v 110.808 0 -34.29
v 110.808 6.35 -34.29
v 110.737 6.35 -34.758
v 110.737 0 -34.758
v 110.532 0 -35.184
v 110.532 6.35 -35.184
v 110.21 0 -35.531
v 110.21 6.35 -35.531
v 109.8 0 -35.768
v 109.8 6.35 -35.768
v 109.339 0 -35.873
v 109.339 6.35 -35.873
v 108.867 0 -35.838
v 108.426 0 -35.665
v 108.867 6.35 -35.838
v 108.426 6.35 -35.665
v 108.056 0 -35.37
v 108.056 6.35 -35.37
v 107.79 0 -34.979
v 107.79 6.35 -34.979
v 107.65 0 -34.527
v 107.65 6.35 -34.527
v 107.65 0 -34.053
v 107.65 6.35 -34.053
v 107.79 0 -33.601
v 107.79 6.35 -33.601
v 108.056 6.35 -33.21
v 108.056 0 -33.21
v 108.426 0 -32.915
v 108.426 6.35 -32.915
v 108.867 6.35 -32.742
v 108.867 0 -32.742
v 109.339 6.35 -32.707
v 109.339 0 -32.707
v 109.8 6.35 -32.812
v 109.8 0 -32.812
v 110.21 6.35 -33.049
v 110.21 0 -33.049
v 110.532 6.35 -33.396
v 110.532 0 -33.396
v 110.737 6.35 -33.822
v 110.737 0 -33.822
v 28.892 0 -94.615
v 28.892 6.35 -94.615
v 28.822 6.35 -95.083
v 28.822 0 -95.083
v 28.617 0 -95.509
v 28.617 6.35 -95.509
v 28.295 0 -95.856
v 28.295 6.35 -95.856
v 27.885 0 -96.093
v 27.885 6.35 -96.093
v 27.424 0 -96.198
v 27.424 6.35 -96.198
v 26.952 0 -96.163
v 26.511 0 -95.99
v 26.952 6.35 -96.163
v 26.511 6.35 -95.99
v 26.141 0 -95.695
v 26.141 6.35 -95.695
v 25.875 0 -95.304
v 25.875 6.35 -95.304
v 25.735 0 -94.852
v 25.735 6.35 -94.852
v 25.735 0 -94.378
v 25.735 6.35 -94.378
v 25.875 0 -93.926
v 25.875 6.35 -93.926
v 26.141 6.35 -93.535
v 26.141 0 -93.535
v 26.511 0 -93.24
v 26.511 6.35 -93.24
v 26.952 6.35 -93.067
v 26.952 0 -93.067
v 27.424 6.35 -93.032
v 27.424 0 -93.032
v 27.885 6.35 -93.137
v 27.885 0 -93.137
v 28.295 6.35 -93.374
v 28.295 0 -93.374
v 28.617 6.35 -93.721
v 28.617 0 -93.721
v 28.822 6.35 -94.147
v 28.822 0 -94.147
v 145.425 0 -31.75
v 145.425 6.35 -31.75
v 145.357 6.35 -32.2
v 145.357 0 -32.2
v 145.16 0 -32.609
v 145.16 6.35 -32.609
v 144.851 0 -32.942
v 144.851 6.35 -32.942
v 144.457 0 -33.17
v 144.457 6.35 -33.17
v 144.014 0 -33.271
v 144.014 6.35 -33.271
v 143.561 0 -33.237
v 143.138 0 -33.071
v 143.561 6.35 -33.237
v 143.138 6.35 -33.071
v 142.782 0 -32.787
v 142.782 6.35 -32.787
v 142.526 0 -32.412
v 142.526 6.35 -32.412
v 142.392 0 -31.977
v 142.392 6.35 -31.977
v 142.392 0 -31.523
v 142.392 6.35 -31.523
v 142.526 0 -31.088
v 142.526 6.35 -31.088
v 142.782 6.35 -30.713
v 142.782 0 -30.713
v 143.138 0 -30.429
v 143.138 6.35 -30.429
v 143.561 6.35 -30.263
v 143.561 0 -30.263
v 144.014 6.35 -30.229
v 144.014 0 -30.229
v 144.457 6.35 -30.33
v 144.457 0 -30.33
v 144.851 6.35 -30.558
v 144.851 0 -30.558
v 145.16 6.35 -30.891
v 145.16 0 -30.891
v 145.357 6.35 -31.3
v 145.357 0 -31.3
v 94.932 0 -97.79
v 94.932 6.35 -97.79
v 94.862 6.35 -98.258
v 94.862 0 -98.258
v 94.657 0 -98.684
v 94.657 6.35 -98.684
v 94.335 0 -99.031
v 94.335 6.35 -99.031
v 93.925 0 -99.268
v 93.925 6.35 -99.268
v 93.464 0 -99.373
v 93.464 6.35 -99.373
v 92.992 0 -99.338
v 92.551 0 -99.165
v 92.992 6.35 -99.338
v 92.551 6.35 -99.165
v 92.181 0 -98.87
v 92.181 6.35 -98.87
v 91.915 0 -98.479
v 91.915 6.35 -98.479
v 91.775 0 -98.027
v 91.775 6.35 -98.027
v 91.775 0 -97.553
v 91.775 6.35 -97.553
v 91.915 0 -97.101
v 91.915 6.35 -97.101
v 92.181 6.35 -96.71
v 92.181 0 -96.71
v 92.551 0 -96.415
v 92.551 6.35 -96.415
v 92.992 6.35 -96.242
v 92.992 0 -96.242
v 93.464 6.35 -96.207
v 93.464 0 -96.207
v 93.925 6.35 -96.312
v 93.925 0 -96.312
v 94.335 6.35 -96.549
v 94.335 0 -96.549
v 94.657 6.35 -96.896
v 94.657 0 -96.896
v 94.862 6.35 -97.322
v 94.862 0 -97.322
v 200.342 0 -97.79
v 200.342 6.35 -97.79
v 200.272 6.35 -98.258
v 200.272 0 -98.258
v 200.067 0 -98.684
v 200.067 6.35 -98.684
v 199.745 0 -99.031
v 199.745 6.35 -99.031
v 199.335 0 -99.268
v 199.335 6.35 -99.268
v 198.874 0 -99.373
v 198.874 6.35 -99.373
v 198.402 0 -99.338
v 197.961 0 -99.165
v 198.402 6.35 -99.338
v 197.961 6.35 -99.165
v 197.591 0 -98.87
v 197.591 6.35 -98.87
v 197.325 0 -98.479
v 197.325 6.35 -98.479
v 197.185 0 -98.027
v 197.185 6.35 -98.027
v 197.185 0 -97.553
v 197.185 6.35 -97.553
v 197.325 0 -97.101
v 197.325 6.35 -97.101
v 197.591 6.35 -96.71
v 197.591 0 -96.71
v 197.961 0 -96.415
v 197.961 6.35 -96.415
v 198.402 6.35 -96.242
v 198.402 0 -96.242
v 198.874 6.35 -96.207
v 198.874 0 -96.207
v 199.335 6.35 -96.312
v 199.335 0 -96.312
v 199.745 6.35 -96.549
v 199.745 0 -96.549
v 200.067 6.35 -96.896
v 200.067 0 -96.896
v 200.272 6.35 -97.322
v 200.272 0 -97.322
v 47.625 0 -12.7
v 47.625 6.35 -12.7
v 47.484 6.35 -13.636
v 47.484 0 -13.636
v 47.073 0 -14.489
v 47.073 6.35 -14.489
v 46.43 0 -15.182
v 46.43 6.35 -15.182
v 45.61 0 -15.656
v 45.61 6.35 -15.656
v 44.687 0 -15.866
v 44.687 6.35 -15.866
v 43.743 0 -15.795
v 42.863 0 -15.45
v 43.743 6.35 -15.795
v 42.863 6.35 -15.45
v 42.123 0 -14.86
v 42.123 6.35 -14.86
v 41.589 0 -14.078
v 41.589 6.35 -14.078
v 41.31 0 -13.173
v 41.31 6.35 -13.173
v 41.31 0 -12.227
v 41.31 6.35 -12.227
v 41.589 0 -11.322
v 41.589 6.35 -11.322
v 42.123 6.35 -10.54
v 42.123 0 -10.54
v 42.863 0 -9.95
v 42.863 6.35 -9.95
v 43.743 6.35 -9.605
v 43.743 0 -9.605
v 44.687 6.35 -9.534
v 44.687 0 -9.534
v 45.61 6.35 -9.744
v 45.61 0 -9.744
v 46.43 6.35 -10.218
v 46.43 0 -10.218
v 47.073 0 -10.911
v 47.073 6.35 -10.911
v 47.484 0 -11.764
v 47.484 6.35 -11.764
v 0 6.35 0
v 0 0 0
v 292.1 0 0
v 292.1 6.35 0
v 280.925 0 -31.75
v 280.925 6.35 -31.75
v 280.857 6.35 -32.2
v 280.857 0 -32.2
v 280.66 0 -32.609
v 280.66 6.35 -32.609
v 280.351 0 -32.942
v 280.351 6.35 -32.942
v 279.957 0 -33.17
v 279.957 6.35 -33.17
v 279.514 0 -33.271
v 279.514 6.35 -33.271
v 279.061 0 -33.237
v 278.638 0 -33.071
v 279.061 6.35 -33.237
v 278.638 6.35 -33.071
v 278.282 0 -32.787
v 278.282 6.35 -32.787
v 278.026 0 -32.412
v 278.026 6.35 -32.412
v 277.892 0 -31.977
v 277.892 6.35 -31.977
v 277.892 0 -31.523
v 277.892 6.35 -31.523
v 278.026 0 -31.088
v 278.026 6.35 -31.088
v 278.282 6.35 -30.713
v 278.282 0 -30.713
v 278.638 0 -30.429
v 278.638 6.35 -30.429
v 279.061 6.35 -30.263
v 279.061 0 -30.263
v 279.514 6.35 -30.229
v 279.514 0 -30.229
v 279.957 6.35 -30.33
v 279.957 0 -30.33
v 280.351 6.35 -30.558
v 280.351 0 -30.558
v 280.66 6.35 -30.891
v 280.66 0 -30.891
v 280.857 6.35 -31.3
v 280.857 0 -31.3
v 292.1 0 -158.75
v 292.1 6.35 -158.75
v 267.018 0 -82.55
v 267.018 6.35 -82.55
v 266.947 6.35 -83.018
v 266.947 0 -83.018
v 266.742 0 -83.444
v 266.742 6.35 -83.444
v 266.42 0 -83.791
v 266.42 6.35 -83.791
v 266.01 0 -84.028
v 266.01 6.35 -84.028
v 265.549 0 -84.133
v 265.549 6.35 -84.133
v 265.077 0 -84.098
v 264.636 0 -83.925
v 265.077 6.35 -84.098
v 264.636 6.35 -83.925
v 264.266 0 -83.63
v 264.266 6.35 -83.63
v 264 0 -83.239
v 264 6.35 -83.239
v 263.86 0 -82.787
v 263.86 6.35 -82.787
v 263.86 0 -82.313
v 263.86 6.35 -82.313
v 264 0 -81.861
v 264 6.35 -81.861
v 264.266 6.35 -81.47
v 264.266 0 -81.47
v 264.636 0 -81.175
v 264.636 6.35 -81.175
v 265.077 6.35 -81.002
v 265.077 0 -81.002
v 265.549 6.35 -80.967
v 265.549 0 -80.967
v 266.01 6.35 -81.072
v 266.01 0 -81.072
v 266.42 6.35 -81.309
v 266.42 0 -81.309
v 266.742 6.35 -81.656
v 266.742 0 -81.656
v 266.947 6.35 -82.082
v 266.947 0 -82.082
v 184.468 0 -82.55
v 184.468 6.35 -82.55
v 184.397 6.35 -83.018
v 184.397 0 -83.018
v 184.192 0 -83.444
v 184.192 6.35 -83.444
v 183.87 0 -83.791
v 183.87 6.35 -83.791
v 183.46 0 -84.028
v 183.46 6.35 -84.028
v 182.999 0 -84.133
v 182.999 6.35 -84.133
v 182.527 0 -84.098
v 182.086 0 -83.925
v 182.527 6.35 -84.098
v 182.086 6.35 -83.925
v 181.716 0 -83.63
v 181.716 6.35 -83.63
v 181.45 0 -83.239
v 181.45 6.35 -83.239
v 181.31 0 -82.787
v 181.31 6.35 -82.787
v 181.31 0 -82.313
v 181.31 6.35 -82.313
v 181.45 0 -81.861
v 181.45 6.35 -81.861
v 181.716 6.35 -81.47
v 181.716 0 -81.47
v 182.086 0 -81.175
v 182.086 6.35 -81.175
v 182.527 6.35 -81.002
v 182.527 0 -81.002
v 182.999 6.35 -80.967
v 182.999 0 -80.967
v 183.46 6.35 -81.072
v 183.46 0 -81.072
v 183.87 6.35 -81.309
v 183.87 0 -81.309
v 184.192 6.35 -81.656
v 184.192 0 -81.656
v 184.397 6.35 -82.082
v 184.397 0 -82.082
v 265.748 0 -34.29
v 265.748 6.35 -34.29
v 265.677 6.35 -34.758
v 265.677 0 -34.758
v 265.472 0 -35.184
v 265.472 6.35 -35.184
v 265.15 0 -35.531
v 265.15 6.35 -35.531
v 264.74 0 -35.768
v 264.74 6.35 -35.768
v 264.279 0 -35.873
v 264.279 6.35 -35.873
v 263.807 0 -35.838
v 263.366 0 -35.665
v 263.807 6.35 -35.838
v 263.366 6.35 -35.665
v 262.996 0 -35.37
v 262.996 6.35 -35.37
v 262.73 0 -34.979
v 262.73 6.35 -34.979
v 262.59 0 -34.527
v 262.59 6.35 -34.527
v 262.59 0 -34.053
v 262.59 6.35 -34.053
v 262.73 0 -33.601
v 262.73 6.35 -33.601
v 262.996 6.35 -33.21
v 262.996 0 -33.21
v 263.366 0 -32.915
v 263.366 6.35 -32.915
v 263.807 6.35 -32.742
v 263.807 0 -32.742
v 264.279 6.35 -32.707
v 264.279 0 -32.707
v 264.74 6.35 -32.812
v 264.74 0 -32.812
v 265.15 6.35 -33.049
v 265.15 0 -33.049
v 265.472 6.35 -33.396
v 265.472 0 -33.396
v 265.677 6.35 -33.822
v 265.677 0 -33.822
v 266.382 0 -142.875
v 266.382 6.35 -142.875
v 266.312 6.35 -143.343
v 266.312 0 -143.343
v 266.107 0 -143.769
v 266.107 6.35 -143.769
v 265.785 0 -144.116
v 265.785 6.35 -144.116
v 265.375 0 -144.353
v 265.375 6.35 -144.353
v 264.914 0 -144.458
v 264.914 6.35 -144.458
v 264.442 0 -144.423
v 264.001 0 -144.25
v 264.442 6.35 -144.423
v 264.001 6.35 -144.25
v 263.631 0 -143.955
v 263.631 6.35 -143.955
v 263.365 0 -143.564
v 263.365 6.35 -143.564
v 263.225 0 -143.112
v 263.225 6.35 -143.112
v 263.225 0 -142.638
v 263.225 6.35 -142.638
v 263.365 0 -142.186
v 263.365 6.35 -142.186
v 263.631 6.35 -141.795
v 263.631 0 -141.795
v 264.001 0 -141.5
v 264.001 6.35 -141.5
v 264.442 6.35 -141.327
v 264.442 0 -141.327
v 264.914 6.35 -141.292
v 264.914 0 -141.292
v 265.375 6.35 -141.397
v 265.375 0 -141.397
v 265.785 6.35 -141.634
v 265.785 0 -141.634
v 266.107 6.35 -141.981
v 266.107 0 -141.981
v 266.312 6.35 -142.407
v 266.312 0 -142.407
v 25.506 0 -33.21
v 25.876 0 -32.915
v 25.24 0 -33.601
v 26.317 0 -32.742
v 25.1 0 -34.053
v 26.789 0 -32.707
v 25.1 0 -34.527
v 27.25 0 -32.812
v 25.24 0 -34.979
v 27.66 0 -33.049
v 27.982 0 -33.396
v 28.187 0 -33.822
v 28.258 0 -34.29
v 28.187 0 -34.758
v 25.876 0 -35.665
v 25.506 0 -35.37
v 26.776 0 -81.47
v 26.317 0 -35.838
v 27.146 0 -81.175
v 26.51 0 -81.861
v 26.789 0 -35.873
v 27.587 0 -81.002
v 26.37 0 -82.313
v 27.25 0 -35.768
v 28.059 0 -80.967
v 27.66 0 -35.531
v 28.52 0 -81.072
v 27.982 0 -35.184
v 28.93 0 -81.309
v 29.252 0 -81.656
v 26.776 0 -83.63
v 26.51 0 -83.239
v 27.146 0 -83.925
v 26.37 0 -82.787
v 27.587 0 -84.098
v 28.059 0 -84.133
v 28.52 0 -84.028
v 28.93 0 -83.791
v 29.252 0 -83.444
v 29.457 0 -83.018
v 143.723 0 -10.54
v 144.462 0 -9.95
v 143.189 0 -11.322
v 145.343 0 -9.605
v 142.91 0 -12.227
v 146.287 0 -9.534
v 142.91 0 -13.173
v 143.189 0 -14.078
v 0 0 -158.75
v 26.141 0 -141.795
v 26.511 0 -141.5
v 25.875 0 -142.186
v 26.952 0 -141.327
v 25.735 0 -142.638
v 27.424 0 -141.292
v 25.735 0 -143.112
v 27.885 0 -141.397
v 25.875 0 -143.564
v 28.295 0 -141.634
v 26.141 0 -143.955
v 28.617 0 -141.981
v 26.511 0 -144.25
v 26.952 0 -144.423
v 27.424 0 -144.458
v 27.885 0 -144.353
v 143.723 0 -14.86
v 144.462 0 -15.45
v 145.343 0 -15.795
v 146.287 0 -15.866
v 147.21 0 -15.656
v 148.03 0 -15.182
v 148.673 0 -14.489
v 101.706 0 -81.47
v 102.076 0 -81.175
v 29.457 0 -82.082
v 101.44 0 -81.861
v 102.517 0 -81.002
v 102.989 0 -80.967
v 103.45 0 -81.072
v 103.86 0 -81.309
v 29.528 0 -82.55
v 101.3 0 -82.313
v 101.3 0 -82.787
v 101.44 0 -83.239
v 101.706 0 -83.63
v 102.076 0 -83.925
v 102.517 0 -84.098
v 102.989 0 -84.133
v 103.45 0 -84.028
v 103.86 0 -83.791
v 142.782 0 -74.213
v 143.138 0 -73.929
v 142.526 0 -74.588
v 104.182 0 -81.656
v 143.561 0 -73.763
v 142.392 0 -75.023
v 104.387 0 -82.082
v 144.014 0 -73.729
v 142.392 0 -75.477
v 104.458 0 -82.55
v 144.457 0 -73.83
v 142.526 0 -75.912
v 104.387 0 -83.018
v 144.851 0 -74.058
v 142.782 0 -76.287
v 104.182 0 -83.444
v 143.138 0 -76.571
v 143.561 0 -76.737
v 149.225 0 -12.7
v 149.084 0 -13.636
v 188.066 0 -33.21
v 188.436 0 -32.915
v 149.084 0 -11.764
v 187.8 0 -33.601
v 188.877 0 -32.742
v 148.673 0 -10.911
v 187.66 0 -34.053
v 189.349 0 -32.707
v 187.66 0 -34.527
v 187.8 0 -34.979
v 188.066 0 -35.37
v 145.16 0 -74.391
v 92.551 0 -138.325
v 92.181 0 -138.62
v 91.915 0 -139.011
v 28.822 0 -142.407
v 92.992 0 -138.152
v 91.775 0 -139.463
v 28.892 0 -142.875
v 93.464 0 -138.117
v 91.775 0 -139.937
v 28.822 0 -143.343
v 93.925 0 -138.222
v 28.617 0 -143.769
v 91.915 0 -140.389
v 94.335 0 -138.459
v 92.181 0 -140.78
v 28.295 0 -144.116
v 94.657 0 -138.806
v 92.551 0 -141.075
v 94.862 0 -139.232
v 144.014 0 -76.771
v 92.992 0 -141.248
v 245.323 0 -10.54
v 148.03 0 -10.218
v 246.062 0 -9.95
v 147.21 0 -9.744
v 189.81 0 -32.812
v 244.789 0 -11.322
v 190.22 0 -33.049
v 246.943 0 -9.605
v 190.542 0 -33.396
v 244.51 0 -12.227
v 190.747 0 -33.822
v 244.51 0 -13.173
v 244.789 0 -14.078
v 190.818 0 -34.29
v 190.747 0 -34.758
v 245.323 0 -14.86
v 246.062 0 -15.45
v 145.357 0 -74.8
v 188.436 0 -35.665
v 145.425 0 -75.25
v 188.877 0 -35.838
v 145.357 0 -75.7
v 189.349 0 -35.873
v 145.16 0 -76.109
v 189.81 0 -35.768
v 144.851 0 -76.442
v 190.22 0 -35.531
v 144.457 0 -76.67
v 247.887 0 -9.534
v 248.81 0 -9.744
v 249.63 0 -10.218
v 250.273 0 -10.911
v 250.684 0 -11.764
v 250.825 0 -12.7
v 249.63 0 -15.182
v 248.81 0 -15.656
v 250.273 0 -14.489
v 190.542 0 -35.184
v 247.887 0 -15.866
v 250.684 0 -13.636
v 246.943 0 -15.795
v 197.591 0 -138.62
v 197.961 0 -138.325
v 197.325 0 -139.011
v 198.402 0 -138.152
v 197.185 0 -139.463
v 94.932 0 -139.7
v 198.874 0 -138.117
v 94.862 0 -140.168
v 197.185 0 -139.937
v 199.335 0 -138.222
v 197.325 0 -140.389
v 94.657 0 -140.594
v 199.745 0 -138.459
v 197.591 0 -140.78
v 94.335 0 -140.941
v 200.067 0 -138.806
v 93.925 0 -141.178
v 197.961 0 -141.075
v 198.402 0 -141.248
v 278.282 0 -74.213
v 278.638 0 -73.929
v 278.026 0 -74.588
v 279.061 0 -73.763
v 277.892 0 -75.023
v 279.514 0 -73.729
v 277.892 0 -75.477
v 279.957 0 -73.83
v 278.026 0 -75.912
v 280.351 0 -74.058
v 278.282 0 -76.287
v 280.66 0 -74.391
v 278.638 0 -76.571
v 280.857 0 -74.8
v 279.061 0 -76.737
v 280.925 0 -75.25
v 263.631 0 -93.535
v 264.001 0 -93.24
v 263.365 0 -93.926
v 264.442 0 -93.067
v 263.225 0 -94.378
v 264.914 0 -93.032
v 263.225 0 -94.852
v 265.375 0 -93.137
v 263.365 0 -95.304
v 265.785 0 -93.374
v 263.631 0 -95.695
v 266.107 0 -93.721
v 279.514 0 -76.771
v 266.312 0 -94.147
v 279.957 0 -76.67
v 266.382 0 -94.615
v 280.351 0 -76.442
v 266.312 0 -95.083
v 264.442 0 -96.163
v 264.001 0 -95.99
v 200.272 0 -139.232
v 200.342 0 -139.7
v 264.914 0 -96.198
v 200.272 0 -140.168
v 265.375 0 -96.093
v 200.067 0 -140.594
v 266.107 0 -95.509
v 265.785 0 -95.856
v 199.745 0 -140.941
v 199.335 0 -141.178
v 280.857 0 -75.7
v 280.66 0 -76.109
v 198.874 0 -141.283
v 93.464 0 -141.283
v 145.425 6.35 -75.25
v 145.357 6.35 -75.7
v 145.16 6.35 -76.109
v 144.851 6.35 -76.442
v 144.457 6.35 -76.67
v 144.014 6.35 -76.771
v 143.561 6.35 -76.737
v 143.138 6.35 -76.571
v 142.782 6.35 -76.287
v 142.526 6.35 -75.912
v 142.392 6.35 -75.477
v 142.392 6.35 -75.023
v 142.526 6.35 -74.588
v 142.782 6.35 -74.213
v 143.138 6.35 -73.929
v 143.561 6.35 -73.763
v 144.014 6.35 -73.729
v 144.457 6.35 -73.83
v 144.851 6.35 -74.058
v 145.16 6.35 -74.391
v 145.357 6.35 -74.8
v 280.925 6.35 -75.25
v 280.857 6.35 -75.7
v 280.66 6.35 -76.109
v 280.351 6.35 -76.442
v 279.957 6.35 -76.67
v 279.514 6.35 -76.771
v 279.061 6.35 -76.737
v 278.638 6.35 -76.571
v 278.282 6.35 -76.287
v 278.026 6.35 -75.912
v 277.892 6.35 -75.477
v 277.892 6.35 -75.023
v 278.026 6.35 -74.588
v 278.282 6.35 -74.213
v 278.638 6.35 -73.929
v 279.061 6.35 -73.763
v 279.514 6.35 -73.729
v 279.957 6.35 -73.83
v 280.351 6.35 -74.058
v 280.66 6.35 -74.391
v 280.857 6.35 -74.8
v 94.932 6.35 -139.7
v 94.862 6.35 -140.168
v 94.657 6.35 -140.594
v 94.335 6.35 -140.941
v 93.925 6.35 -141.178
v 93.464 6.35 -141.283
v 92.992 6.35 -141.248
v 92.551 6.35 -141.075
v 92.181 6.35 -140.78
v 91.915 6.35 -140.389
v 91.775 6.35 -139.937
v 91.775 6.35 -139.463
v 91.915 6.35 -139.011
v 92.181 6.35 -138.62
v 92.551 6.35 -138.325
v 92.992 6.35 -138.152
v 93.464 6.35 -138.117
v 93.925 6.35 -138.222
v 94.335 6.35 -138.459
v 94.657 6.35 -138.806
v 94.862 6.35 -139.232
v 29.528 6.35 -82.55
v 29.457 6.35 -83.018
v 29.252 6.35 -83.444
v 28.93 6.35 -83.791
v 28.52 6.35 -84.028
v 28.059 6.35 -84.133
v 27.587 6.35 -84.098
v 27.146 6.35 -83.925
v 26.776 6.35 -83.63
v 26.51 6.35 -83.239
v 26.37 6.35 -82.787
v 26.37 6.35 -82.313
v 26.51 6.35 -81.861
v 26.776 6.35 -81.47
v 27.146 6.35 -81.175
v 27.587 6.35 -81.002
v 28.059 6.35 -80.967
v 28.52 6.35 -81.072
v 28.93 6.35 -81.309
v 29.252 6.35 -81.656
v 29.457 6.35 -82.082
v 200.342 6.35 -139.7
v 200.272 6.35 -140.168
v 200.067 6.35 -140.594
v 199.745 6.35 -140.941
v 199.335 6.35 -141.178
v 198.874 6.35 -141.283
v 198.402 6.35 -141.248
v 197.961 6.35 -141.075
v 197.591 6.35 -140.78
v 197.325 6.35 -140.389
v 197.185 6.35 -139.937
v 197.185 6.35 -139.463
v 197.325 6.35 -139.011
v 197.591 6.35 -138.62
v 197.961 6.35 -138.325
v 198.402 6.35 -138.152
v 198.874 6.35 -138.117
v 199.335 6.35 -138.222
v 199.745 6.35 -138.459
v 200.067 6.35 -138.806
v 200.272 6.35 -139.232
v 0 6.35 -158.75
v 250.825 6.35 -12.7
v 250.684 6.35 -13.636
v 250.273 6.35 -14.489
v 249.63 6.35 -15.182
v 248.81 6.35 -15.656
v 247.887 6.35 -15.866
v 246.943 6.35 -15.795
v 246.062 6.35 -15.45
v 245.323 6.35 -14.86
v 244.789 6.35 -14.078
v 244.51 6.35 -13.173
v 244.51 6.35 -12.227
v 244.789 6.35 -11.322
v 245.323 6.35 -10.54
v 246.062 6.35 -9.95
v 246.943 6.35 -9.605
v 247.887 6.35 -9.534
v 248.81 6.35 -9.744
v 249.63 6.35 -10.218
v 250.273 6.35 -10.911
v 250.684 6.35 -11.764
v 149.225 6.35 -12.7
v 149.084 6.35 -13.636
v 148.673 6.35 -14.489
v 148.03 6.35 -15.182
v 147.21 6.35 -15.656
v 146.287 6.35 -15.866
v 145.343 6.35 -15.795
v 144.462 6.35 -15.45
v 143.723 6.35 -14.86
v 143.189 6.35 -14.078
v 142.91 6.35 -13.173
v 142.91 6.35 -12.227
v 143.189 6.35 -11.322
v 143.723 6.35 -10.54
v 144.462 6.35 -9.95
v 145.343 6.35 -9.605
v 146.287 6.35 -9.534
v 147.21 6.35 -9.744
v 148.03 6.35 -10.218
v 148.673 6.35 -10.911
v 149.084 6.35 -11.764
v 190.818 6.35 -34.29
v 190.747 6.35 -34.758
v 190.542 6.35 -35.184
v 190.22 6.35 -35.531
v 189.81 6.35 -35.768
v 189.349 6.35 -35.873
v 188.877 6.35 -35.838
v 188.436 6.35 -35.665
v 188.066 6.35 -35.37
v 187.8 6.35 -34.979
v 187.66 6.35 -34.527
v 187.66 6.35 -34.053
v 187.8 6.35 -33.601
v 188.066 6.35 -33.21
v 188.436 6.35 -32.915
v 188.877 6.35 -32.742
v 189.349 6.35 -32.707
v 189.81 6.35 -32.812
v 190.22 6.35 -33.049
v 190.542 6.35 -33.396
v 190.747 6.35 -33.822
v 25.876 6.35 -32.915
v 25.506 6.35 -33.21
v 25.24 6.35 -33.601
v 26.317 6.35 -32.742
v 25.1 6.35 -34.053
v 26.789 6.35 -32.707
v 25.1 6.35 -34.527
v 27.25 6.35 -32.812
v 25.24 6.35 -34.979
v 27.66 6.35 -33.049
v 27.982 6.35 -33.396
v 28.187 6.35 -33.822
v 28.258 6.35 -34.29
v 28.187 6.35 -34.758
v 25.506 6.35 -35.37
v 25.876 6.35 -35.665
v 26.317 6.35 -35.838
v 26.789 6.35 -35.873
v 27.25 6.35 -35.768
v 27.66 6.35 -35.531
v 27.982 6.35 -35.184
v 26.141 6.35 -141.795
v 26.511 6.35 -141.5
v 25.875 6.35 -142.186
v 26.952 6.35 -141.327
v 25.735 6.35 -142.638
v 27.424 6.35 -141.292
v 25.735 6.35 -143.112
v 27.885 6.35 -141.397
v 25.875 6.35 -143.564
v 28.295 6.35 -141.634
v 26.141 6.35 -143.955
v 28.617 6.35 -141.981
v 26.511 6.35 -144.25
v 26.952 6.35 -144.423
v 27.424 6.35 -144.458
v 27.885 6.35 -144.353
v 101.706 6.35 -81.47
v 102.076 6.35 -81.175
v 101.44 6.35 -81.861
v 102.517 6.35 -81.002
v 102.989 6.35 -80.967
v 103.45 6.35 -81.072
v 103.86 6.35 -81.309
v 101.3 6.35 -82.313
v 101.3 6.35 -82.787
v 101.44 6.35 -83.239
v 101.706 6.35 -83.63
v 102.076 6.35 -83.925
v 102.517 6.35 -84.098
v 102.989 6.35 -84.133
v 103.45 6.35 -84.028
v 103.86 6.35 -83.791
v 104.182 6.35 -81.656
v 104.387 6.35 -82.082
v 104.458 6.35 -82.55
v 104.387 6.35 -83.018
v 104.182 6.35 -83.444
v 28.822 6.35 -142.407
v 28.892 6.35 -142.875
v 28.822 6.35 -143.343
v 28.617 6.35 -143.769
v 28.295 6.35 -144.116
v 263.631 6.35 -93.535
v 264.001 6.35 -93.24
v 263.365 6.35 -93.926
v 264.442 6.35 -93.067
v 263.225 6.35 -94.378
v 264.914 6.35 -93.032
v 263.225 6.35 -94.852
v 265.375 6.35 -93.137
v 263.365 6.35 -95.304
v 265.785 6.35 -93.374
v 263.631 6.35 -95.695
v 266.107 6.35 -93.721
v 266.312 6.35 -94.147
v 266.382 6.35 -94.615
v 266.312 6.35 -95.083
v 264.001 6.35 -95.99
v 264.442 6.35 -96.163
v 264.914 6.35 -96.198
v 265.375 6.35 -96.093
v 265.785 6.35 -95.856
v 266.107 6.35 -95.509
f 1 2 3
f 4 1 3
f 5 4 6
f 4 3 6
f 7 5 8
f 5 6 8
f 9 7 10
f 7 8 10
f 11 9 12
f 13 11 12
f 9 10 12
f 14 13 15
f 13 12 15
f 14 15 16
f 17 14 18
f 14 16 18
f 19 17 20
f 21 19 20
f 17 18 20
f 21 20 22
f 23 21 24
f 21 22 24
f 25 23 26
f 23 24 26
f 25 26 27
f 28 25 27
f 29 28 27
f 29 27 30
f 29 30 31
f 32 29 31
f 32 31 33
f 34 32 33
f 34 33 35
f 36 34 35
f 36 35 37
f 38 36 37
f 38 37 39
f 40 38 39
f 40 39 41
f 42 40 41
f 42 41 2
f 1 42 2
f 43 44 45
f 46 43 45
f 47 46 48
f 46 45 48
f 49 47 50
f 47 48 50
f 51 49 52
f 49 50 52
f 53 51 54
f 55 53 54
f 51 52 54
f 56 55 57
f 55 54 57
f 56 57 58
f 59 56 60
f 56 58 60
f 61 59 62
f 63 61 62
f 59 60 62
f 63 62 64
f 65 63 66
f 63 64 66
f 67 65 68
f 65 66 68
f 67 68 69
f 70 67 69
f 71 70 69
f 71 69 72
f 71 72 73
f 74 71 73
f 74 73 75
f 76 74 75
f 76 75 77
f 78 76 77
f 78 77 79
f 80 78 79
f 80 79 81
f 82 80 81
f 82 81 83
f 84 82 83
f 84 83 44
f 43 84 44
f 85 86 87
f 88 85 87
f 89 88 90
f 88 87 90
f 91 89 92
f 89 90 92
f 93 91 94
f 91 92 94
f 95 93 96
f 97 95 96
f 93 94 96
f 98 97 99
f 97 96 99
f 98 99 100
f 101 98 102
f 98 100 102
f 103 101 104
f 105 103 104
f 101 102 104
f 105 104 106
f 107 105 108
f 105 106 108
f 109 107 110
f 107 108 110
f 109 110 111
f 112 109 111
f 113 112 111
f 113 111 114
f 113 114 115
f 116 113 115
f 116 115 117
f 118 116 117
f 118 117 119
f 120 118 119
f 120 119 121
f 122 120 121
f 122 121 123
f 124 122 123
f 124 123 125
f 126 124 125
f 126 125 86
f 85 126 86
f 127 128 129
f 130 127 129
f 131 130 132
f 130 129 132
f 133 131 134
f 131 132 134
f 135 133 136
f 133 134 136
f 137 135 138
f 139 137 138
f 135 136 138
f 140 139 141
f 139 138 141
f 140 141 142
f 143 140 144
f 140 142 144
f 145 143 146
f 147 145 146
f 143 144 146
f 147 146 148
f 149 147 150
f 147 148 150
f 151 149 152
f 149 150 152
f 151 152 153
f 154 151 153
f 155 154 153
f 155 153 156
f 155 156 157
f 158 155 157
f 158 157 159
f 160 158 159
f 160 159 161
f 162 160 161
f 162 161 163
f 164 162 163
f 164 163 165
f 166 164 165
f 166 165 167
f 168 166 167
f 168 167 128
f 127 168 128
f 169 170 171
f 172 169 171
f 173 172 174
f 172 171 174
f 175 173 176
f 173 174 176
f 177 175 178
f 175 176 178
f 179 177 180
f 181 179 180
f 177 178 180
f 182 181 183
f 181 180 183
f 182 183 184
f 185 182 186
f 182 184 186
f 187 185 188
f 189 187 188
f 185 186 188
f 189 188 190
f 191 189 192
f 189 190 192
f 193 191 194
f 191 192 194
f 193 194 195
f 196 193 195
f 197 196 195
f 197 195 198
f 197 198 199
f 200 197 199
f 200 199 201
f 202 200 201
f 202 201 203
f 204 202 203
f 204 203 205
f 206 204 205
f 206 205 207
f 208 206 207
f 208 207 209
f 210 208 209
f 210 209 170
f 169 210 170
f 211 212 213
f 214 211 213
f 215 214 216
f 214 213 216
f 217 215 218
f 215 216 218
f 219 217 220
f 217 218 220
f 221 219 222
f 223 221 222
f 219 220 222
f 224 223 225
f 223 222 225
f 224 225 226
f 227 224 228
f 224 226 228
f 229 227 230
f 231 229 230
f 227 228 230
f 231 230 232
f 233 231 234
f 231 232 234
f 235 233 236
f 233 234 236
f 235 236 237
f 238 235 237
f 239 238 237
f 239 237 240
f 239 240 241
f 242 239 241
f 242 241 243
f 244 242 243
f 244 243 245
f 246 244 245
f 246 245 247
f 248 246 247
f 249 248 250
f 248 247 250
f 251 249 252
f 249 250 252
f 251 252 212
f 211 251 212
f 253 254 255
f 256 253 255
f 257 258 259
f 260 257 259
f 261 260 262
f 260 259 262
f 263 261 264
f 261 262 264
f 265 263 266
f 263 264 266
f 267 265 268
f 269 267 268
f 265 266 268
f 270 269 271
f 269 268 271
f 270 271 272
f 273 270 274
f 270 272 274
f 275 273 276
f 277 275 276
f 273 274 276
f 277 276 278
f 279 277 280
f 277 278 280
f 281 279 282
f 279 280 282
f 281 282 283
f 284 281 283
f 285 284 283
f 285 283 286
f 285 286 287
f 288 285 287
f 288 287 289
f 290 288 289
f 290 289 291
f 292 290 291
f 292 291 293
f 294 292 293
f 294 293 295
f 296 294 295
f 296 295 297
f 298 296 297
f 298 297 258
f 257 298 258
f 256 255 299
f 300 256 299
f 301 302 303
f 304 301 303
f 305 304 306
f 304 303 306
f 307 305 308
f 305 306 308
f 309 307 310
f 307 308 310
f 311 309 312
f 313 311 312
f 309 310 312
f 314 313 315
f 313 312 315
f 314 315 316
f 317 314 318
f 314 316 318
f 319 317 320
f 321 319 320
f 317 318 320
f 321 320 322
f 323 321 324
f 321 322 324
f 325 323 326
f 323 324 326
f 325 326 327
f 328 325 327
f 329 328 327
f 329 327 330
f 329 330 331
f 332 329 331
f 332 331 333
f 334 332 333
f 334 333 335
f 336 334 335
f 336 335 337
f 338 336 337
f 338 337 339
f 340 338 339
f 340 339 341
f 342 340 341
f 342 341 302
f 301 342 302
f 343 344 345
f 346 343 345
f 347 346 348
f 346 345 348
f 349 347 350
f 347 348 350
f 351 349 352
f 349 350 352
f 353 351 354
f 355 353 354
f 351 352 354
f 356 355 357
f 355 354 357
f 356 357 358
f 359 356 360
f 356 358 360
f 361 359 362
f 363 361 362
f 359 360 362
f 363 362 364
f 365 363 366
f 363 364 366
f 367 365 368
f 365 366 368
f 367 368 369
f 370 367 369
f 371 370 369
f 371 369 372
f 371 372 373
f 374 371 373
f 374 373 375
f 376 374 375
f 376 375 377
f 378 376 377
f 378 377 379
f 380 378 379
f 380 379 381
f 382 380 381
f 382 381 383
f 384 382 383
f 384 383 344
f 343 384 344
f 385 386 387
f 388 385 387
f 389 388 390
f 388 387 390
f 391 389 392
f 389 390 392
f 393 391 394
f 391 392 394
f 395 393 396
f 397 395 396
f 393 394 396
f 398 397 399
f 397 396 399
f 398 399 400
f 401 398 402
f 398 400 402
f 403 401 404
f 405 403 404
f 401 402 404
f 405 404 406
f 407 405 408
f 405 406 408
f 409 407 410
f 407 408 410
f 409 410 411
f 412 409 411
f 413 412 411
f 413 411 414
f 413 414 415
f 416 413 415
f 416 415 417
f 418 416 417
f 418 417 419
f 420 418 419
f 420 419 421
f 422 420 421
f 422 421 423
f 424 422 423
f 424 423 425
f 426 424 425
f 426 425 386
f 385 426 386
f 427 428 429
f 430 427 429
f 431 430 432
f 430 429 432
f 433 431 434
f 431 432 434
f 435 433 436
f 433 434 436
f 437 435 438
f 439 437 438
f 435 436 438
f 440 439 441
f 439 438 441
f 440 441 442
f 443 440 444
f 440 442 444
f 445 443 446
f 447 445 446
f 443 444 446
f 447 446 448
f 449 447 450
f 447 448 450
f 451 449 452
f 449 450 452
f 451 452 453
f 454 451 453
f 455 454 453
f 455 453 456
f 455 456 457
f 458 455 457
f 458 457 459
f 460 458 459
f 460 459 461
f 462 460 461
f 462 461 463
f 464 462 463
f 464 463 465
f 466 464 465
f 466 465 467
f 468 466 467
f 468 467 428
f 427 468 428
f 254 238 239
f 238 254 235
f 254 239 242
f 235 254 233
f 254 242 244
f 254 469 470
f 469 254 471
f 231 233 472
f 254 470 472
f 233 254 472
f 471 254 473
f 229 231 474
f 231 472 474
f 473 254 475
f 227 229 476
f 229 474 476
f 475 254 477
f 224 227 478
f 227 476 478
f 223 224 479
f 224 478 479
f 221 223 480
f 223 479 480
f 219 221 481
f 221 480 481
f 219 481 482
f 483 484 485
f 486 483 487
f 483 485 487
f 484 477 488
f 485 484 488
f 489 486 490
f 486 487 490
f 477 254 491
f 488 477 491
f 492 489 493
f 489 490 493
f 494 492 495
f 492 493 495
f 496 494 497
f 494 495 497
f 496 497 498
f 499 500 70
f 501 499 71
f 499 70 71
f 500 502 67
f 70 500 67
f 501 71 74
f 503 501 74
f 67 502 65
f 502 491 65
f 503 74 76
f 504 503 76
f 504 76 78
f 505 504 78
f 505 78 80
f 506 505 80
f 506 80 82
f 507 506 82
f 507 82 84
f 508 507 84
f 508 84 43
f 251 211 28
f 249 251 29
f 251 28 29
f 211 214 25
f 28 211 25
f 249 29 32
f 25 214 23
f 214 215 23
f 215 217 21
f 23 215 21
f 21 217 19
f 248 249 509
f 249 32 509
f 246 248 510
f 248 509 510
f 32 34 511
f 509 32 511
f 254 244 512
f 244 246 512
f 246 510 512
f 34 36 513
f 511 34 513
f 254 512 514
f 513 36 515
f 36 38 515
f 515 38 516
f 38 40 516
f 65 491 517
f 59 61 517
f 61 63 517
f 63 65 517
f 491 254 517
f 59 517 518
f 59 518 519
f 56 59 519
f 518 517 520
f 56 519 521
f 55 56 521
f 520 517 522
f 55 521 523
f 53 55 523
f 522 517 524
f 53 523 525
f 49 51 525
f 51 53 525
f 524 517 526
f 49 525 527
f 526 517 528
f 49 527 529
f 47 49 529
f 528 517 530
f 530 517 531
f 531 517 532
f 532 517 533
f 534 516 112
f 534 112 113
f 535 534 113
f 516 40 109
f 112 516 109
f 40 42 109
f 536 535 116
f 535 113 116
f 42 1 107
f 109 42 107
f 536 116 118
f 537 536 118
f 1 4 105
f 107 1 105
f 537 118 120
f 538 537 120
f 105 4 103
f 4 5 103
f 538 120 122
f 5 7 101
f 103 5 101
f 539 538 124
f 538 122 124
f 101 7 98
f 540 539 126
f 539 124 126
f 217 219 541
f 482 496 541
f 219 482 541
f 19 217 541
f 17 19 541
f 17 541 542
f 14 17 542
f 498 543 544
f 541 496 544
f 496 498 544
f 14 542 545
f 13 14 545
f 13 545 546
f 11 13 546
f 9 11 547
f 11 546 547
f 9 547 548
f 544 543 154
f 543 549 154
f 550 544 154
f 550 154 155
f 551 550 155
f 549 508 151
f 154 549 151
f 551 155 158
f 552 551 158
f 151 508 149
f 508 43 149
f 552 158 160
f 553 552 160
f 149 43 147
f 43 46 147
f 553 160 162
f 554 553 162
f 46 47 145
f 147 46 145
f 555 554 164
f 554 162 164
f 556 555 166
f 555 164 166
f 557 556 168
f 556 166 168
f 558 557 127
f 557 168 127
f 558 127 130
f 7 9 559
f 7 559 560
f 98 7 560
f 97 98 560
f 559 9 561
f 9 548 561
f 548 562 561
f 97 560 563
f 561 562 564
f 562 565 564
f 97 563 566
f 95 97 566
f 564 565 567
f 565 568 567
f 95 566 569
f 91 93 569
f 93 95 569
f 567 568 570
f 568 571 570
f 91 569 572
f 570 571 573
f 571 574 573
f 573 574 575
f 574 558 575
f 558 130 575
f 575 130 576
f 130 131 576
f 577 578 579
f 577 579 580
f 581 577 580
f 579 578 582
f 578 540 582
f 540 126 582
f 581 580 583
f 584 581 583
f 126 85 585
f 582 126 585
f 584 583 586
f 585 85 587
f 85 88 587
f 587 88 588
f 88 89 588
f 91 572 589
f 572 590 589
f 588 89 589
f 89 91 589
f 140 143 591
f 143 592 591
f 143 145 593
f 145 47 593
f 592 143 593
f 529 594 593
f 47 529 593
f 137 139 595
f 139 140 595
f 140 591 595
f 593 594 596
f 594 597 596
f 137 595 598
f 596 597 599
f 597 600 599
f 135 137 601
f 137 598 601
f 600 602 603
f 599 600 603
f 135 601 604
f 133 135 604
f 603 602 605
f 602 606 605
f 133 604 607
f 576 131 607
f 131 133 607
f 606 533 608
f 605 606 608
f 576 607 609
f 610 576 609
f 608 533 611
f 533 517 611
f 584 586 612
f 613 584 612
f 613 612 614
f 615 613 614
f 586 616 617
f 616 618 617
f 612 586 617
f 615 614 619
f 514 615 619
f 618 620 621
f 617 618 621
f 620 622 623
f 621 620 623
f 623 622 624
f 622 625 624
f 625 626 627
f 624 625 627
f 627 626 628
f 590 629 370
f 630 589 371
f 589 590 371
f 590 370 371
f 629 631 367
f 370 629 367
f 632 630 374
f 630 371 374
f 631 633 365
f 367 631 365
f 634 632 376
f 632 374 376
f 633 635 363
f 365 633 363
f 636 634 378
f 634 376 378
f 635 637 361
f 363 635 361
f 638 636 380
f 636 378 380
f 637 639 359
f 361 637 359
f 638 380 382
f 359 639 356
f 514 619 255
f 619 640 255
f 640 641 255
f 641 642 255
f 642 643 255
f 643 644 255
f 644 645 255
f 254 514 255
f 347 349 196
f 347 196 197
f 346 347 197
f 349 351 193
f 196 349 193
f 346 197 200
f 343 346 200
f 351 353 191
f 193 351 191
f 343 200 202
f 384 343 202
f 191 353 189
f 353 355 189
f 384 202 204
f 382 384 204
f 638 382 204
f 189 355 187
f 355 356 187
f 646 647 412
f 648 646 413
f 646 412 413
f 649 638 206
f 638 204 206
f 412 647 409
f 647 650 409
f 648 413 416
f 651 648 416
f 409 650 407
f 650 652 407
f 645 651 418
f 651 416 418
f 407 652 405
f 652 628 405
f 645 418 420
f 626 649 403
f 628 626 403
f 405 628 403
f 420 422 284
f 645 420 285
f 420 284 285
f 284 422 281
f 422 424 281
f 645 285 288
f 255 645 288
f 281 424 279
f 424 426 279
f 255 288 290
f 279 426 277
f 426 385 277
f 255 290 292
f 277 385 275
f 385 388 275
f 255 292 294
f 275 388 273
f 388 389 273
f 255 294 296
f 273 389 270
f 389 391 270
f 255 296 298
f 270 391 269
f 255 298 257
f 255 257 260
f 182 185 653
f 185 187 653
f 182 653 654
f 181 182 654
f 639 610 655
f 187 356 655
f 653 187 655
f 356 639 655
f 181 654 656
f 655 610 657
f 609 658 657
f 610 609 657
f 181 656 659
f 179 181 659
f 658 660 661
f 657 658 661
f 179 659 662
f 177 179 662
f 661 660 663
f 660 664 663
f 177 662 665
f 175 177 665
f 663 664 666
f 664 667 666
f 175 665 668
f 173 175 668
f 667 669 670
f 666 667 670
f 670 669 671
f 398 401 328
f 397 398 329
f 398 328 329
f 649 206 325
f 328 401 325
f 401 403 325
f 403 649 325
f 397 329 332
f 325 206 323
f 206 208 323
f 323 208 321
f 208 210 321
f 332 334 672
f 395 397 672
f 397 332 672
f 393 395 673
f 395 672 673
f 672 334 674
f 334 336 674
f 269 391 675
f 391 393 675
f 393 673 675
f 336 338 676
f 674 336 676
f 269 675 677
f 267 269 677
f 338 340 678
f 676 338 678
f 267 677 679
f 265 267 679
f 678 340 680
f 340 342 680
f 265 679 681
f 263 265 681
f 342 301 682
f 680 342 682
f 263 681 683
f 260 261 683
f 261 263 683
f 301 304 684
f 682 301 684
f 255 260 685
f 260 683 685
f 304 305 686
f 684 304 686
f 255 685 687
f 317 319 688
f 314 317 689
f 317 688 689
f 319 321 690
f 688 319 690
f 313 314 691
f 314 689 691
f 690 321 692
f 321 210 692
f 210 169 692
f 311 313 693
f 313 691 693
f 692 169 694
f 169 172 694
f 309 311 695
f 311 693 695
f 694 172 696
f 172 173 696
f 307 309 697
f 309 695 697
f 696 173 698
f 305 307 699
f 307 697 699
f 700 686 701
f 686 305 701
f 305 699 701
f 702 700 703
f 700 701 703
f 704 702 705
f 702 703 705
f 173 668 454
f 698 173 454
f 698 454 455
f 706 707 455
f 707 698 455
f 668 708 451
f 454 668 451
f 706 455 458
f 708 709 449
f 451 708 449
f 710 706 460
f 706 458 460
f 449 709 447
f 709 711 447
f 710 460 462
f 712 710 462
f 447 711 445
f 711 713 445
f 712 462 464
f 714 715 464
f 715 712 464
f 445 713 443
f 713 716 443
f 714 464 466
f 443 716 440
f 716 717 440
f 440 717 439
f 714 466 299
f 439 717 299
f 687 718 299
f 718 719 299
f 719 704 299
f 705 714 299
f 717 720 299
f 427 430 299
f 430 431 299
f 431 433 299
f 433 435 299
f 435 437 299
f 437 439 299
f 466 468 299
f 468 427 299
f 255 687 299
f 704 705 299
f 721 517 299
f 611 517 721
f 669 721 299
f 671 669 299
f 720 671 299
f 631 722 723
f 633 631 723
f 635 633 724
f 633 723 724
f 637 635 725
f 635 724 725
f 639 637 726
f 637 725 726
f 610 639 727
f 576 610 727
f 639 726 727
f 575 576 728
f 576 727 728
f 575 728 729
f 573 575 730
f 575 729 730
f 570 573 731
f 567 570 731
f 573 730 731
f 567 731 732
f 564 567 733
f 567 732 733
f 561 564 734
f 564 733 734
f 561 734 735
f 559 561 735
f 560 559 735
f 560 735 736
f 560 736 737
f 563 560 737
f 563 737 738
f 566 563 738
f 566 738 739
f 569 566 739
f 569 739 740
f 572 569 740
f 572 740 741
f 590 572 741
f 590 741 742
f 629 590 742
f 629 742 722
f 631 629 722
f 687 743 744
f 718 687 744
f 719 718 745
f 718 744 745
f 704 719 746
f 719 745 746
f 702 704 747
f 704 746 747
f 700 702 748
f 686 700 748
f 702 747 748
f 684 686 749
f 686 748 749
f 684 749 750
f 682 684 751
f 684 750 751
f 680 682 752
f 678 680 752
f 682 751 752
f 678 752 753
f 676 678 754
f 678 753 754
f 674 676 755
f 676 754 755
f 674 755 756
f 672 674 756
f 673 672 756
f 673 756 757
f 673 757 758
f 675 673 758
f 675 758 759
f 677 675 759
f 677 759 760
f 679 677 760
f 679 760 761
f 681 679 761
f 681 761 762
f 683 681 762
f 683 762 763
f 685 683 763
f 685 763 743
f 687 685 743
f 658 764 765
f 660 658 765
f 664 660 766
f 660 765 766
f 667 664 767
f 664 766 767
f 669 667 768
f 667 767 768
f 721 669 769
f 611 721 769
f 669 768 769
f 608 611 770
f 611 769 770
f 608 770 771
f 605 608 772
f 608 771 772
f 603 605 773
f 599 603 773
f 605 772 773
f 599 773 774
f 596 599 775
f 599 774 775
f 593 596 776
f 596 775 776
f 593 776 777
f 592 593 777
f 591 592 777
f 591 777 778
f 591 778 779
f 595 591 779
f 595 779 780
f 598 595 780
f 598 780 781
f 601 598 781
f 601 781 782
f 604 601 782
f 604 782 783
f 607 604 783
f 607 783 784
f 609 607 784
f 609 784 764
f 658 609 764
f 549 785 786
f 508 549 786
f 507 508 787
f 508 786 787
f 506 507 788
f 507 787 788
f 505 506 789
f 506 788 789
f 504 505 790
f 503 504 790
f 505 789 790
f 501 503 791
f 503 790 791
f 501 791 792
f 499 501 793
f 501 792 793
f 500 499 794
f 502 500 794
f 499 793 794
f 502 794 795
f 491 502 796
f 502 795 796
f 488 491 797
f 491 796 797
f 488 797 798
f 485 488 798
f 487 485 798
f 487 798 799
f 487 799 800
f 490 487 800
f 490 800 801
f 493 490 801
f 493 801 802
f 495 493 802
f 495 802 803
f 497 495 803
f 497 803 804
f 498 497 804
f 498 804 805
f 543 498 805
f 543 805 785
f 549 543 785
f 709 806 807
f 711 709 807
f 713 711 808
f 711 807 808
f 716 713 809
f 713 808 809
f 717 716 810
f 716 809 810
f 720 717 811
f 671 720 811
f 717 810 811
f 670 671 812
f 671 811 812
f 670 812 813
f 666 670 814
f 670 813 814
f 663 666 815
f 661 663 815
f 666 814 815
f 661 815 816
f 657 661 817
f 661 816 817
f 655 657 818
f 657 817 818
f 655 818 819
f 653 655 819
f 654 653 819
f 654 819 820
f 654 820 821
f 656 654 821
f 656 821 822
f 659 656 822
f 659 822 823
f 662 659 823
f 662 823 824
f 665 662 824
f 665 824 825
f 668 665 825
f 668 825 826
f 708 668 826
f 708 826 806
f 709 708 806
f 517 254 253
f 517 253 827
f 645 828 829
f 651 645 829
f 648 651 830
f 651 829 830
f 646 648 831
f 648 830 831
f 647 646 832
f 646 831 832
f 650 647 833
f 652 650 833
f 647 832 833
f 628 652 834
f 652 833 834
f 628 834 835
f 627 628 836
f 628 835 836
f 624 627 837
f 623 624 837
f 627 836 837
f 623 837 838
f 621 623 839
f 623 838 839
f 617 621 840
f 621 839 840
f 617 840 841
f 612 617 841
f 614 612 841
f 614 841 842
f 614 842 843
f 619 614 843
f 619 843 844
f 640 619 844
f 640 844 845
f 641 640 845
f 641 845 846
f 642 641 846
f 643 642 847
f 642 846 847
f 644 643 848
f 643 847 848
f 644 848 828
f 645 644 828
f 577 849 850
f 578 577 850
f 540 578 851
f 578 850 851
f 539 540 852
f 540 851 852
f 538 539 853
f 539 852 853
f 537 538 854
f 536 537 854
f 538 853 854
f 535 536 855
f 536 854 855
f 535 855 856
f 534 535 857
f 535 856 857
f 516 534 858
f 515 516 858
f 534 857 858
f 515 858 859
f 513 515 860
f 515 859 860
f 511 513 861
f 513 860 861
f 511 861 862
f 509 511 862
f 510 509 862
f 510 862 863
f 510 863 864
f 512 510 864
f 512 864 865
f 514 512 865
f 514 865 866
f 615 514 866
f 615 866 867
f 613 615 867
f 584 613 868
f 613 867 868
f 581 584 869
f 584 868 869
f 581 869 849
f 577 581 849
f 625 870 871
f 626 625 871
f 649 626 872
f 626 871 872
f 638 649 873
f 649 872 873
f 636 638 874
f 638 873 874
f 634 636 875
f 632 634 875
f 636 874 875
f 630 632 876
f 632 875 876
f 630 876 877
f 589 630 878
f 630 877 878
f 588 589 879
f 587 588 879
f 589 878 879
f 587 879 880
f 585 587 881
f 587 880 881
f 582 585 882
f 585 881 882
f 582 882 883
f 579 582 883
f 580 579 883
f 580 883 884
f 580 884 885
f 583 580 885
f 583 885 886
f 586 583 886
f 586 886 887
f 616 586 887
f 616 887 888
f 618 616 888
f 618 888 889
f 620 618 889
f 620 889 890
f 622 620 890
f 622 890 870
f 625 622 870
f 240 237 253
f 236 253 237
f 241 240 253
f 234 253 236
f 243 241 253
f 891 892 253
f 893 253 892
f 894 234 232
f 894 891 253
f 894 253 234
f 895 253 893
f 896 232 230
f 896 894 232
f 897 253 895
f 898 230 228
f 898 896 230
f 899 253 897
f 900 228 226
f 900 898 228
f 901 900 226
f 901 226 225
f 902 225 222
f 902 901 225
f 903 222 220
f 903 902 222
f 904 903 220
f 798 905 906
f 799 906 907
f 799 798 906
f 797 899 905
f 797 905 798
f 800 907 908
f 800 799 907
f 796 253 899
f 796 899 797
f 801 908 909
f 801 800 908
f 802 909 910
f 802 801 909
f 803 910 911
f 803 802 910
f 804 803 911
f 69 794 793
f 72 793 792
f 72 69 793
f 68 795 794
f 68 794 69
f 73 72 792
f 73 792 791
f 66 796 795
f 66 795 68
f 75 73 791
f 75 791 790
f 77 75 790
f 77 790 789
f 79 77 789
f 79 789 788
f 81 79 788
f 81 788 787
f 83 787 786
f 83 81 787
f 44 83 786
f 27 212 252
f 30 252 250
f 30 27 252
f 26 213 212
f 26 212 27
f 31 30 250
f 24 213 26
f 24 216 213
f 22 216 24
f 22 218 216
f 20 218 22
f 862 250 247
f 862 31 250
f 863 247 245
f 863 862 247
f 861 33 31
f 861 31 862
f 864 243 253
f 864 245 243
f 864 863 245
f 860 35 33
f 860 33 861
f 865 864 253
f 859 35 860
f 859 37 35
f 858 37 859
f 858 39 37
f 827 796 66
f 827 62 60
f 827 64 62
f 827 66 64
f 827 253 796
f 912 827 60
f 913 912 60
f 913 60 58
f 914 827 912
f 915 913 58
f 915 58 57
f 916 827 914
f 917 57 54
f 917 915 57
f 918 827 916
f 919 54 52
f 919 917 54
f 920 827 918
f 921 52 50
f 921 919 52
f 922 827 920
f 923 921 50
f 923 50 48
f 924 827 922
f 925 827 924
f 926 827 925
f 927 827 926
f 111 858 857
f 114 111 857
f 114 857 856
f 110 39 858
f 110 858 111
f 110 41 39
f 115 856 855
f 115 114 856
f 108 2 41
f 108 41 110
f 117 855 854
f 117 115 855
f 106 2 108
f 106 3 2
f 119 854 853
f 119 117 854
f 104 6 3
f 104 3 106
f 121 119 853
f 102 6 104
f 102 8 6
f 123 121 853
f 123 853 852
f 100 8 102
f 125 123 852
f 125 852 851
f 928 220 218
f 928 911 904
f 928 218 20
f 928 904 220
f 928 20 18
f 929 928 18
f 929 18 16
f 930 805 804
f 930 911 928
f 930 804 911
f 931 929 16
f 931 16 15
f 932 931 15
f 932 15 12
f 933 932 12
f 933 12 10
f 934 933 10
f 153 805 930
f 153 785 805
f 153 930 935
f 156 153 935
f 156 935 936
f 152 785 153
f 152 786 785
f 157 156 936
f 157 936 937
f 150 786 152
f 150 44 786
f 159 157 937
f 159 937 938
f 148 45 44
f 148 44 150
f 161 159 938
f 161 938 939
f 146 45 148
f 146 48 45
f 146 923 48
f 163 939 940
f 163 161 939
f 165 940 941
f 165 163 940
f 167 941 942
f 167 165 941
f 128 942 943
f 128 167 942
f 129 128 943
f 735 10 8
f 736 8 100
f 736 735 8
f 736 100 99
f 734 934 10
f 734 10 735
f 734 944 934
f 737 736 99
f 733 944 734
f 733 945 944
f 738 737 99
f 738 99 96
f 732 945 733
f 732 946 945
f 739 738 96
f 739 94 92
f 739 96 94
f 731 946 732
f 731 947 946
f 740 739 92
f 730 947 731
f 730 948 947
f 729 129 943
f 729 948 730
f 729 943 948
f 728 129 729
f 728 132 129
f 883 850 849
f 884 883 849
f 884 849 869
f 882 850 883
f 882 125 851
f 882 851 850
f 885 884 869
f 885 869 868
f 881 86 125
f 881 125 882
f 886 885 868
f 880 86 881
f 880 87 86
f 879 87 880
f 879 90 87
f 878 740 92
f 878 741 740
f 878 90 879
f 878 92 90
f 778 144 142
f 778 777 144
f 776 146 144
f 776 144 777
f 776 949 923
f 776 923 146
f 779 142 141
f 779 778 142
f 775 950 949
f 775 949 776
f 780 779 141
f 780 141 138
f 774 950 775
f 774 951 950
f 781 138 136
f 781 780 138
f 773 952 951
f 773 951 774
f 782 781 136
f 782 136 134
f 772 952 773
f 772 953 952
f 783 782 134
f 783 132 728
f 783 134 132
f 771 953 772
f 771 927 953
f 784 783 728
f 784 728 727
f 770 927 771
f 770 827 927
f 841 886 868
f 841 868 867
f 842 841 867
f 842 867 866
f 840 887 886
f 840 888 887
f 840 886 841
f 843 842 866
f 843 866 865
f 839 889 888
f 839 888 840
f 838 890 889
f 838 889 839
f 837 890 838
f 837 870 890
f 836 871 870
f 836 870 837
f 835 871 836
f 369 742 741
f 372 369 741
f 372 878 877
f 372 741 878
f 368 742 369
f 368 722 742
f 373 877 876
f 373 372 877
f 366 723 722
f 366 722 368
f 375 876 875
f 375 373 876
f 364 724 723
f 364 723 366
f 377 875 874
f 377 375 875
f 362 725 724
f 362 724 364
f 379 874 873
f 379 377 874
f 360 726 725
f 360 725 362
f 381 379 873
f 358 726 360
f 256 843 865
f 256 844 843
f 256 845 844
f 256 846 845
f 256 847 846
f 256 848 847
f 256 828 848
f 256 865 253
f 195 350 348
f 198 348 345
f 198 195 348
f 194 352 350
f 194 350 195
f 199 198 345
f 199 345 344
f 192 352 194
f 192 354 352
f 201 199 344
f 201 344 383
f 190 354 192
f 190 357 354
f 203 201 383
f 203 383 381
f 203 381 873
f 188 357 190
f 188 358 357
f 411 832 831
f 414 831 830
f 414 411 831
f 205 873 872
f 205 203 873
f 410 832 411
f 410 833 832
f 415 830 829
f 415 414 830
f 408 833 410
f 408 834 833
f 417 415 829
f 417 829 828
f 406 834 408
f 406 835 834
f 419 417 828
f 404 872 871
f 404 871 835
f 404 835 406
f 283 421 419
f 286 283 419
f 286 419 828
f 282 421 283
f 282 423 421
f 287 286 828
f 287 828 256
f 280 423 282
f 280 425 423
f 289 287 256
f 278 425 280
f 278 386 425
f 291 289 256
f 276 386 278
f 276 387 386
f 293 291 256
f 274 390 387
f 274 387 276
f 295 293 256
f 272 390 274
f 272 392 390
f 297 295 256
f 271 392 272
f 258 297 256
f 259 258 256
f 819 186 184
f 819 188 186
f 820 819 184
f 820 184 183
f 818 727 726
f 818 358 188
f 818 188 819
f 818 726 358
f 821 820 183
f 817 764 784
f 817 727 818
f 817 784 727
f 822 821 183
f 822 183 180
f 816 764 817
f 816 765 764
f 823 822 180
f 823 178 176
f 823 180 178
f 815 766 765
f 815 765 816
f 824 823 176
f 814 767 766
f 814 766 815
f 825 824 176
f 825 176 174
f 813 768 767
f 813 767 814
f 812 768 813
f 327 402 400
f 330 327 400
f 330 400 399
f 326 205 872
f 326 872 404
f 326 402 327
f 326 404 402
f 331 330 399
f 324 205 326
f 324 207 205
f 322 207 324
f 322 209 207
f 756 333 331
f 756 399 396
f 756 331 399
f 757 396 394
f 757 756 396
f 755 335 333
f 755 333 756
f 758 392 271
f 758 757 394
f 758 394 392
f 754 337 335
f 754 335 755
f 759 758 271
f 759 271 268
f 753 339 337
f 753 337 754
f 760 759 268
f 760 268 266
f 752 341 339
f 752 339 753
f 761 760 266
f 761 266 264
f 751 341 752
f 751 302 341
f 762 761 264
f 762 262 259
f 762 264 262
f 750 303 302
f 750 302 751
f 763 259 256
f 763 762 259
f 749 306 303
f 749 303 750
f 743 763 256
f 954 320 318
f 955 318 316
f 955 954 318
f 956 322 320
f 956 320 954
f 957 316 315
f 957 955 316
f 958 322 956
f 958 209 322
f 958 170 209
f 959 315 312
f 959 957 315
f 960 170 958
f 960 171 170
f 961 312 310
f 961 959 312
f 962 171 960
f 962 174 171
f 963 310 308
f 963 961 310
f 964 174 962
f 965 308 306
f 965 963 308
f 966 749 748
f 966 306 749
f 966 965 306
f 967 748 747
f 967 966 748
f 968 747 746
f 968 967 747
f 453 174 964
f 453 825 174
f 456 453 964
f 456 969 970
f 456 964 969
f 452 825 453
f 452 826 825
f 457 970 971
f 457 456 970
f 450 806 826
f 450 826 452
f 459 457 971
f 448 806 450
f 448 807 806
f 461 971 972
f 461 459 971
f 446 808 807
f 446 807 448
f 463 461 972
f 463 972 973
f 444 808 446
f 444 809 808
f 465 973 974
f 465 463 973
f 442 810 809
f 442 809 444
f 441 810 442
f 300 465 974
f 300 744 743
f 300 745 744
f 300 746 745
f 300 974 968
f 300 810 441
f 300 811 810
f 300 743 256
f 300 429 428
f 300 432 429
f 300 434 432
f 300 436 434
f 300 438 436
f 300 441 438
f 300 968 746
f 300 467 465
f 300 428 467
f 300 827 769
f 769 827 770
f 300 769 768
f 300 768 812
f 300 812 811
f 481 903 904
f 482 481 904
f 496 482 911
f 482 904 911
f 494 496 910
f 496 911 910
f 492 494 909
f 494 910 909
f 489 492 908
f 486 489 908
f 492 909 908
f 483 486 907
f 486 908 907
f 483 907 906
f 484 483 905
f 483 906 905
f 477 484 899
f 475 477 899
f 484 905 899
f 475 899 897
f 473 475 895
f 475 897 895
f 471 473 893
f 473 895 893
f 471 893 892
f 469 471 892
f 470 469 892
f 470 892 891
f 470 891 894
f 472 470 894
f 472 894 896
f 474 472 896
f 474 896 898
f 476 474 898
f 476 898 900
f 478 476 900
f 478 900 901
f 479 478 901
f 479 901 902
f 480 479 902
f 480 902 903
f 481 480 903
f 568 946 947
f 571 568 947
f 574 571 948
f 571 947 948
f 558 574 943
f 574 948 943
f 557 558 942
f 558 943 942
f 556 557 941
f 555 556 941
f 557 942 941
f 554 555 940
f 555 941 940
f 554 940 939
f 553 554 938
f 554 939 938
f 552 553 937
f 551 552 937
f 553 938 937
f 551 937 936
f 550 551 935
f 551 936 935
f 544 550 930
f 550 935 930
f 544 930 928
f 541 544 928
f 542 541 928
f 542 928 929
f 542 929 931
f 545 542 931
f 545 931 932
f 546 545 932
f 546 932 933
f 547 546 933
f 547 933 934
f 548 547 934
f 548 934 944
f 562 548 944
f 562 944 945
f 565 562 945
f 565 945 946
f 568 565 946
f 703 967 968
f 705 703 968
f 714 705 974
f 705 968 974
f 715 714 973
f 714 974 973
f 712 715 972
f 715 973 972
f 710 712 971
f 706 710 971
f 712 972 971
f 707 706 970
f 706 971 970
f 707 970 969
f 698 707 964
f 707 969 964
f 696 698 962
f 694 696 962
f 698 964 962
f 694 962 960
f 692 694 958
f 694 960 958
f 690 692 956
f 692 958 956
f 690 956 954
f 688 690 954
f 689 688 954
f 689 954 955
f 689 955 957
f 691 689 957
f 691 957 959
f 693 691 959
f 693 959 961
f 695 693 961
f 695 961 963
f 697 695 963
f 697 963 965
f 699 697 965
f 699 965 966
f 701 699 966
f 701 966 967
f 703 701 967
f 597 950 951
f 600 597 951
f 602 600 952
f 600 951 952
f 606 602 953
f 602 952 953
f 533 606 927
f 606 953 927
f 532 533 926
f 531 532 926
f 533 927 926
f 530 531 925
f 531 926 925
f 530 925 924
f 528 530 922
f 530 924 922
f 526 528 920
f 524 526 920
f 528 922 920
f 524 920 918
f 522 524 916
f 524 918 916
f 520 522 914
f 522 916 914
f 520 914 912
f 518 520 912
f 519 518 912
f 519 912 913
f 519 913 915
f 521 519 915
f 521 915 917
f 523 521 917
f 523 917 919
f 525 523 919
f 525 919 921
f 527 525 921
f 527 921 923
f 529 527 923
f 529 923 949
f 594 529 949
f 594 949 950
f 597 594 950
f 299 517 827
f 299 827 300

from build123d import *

# Parameters (mm, degrees)
SKETCH1_W           = 292.1
SKETCH1_H           = 158.75
BOSS_EXTRUDE1_DEPTH = 6.35
SKETCH2_R           = 3.175
CUT_EXTRUDE2_DEPTH  = 6.35
SKETCH4_R           = 1.5875
CUT_EXTRUDE3_DEPTH  = 7.35
SKETCH5_R           = 1.525
CUT_EXTRUDE4_DEPTH  = 7.35


with BuildPart() as part:
    # Sketch1 → Boss-Extrude1 (new body)
    with BuildSketch(Plane(origin=(0, 0, 0), x_dir=(1, 0, 0), z_dir=(0, 1, 0))):
        with Locations((146.05, 79.375)):
            Rectangle(SKETCH1_W, SKETCH1_H)
    extrude(amount=BOSS_EXTRUDE1_DEPTH)

    # Sketch2 → Cut-Extrude2 (cut)
    with BuildSketch(Plane(origin=(0, 6.35, 0), x_dir=(1, 0, 0), z_dir=(0, 1, 0))):
        with Locations((146.05, 12.7)):
            Circle(SKETCH2_R)
        with Locations((247.65, 12.7)):
            Circle(SKETCH2_R)
        with Locations((44.45, 12.7)):
            Circle(SKETCH2_R)
    extrude(amount=-CUT_EXTRUDE2_DEPTH, mode=Mode.SUBTRACT)

    # Sketch4 → Cut-Extrude3 (cut, through all)
    with BuildSketch(Plane(origin=(0, 6.35, 0), x_dir=(1, 0, 0), z_dir=(0, 1, 0))):
        with Locations((182.88, 82.55)):
            Circle(SKETCH4_R)
        with Locations((189.23, 34.29)):
            Circle(SKETCH4_R)
        with Locations((265.43, 82.55)):
            Circle(SKETCH4_R)
        with Locations((264.16, 34.29)):
            Circle(SKETCH4_R)
        with Locations((264.795, 142.875)):
            Circle(SKETCH4_R)
        with Locations((264.795, 94.615)):
            Circle(SKETCH4_R)
        with Locations((198.755, 97.79)):
            Circle(SKETCH4_R)
        with Locations((198.755, 139.7)):
            Circle(SKETCH4_R)
        with Locations((102.87, 82.55)):
            Circle(SKETCH4_R)
        with Locations((109.22, 34.29)):
            Circle(SKETCH4_R)
        with Locations((26.67, 34.29)):
            Circle(SKETCH4_R)
        with Locations((27.94, 82.55)):
            Circle(SKETCH4_R)
        with Locations((93.345, 139.7)):
            Circle(SKETCH4_R)
        with Locations((93.345, 97.79)):
            Circle(SKETCH4_R)
        with Locations((27.305, 142.875)):
            Circle(SKETCH4_R)
        with Locations((27.305, 94.615)):
            Circle(SKETCH4_R)
    extrude(amount=-CUT_EXTRUDE3_DEPTH, mode=Mode.SUBTRACT)

    # Sketch5 → Cut-Extrude4 (cut, through all)
    with BuildSketch(Plane(origin=(0, 6.35, 0), x_dir=(1, 0, 0), z_dir=(0, 1, 0))):
        with Locations((279.4, 31.75)):
            Circle(SKETCH5_R)
        with Locations((279.4, 75.25)):
            Circle(SKETCH5_R)
        with Locations((143.9, 75.25)):
            Circle(SKETCH5_R)
        with Locations((143.9, 31.75)):
            Circle(SKETCH5_R)
    extrude(amount=-CUT_EXTRUDE4_DEPTH, mode=Mode.SUBTRACT)


solid = part.part
